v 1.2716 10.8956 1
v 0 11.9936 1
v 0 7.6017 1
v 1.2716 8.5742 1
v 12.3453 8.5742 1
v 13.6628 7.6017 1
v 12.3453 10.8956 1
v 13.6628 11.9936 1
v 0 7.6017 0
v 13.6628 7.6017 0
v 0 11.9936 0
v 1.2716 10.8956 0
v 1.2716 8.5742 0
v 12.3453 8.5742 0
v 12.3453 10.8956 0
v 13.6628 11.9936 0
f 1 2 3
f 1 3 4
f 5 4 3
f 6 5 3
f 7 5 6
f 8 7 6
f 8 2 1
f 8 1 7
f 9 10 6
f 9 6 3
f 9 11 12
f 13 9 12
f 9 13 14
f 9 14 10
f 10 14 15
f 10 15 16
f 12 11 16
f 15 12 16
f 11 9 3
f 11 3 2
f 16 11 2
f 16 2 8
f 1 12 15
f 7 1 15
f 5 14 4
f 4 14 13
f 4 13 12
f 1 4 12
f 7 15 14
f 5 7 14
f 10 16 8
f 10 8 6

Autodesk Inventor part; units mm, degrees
ref_plane "YZ Plane" through (0, 0, 0) normal (1, 0, 0) x (0, 1, 0)
ref_plane "XZ Plane" through (0, 0, 0) normal (0, 1, 0) x (-1, 0, 0)
ref_plane "XY Plane" through (0, 0, 0) normal (0, 0, 1) x (1, 0, 0)
sketch "Sketch1" plane through (0, 0, 0) normal (0, 0, 1) x (1, 0, 0)
  line L0 (0, 11.9936) -> (13.6628, 11.9936)
  line L1 (13.6628, 11.9936) -> (13.6628, 7.6017)
  line L2 (13.6628, 7.6017) -> (0, 7.6017)
  line L3 (0, 7.6017) -> (0, 11.9936)
  line L4 (1.2716, 10.8956) -> (12.3453, 10.8956)
  line L5 (12.3453, 10.8956) -> (12.3453, 8.5742)
  line L6 (12.3453, 8.5742) -> (1.2716, 8.5742)
  line L7 (1.2716, 8.5742) -> (1.2716, 10.8956)
  point P0 (0, 0)
extrude "Extrusion1" add sketch "Sketch1" along normal blind 1
properties part number "lcd1"
